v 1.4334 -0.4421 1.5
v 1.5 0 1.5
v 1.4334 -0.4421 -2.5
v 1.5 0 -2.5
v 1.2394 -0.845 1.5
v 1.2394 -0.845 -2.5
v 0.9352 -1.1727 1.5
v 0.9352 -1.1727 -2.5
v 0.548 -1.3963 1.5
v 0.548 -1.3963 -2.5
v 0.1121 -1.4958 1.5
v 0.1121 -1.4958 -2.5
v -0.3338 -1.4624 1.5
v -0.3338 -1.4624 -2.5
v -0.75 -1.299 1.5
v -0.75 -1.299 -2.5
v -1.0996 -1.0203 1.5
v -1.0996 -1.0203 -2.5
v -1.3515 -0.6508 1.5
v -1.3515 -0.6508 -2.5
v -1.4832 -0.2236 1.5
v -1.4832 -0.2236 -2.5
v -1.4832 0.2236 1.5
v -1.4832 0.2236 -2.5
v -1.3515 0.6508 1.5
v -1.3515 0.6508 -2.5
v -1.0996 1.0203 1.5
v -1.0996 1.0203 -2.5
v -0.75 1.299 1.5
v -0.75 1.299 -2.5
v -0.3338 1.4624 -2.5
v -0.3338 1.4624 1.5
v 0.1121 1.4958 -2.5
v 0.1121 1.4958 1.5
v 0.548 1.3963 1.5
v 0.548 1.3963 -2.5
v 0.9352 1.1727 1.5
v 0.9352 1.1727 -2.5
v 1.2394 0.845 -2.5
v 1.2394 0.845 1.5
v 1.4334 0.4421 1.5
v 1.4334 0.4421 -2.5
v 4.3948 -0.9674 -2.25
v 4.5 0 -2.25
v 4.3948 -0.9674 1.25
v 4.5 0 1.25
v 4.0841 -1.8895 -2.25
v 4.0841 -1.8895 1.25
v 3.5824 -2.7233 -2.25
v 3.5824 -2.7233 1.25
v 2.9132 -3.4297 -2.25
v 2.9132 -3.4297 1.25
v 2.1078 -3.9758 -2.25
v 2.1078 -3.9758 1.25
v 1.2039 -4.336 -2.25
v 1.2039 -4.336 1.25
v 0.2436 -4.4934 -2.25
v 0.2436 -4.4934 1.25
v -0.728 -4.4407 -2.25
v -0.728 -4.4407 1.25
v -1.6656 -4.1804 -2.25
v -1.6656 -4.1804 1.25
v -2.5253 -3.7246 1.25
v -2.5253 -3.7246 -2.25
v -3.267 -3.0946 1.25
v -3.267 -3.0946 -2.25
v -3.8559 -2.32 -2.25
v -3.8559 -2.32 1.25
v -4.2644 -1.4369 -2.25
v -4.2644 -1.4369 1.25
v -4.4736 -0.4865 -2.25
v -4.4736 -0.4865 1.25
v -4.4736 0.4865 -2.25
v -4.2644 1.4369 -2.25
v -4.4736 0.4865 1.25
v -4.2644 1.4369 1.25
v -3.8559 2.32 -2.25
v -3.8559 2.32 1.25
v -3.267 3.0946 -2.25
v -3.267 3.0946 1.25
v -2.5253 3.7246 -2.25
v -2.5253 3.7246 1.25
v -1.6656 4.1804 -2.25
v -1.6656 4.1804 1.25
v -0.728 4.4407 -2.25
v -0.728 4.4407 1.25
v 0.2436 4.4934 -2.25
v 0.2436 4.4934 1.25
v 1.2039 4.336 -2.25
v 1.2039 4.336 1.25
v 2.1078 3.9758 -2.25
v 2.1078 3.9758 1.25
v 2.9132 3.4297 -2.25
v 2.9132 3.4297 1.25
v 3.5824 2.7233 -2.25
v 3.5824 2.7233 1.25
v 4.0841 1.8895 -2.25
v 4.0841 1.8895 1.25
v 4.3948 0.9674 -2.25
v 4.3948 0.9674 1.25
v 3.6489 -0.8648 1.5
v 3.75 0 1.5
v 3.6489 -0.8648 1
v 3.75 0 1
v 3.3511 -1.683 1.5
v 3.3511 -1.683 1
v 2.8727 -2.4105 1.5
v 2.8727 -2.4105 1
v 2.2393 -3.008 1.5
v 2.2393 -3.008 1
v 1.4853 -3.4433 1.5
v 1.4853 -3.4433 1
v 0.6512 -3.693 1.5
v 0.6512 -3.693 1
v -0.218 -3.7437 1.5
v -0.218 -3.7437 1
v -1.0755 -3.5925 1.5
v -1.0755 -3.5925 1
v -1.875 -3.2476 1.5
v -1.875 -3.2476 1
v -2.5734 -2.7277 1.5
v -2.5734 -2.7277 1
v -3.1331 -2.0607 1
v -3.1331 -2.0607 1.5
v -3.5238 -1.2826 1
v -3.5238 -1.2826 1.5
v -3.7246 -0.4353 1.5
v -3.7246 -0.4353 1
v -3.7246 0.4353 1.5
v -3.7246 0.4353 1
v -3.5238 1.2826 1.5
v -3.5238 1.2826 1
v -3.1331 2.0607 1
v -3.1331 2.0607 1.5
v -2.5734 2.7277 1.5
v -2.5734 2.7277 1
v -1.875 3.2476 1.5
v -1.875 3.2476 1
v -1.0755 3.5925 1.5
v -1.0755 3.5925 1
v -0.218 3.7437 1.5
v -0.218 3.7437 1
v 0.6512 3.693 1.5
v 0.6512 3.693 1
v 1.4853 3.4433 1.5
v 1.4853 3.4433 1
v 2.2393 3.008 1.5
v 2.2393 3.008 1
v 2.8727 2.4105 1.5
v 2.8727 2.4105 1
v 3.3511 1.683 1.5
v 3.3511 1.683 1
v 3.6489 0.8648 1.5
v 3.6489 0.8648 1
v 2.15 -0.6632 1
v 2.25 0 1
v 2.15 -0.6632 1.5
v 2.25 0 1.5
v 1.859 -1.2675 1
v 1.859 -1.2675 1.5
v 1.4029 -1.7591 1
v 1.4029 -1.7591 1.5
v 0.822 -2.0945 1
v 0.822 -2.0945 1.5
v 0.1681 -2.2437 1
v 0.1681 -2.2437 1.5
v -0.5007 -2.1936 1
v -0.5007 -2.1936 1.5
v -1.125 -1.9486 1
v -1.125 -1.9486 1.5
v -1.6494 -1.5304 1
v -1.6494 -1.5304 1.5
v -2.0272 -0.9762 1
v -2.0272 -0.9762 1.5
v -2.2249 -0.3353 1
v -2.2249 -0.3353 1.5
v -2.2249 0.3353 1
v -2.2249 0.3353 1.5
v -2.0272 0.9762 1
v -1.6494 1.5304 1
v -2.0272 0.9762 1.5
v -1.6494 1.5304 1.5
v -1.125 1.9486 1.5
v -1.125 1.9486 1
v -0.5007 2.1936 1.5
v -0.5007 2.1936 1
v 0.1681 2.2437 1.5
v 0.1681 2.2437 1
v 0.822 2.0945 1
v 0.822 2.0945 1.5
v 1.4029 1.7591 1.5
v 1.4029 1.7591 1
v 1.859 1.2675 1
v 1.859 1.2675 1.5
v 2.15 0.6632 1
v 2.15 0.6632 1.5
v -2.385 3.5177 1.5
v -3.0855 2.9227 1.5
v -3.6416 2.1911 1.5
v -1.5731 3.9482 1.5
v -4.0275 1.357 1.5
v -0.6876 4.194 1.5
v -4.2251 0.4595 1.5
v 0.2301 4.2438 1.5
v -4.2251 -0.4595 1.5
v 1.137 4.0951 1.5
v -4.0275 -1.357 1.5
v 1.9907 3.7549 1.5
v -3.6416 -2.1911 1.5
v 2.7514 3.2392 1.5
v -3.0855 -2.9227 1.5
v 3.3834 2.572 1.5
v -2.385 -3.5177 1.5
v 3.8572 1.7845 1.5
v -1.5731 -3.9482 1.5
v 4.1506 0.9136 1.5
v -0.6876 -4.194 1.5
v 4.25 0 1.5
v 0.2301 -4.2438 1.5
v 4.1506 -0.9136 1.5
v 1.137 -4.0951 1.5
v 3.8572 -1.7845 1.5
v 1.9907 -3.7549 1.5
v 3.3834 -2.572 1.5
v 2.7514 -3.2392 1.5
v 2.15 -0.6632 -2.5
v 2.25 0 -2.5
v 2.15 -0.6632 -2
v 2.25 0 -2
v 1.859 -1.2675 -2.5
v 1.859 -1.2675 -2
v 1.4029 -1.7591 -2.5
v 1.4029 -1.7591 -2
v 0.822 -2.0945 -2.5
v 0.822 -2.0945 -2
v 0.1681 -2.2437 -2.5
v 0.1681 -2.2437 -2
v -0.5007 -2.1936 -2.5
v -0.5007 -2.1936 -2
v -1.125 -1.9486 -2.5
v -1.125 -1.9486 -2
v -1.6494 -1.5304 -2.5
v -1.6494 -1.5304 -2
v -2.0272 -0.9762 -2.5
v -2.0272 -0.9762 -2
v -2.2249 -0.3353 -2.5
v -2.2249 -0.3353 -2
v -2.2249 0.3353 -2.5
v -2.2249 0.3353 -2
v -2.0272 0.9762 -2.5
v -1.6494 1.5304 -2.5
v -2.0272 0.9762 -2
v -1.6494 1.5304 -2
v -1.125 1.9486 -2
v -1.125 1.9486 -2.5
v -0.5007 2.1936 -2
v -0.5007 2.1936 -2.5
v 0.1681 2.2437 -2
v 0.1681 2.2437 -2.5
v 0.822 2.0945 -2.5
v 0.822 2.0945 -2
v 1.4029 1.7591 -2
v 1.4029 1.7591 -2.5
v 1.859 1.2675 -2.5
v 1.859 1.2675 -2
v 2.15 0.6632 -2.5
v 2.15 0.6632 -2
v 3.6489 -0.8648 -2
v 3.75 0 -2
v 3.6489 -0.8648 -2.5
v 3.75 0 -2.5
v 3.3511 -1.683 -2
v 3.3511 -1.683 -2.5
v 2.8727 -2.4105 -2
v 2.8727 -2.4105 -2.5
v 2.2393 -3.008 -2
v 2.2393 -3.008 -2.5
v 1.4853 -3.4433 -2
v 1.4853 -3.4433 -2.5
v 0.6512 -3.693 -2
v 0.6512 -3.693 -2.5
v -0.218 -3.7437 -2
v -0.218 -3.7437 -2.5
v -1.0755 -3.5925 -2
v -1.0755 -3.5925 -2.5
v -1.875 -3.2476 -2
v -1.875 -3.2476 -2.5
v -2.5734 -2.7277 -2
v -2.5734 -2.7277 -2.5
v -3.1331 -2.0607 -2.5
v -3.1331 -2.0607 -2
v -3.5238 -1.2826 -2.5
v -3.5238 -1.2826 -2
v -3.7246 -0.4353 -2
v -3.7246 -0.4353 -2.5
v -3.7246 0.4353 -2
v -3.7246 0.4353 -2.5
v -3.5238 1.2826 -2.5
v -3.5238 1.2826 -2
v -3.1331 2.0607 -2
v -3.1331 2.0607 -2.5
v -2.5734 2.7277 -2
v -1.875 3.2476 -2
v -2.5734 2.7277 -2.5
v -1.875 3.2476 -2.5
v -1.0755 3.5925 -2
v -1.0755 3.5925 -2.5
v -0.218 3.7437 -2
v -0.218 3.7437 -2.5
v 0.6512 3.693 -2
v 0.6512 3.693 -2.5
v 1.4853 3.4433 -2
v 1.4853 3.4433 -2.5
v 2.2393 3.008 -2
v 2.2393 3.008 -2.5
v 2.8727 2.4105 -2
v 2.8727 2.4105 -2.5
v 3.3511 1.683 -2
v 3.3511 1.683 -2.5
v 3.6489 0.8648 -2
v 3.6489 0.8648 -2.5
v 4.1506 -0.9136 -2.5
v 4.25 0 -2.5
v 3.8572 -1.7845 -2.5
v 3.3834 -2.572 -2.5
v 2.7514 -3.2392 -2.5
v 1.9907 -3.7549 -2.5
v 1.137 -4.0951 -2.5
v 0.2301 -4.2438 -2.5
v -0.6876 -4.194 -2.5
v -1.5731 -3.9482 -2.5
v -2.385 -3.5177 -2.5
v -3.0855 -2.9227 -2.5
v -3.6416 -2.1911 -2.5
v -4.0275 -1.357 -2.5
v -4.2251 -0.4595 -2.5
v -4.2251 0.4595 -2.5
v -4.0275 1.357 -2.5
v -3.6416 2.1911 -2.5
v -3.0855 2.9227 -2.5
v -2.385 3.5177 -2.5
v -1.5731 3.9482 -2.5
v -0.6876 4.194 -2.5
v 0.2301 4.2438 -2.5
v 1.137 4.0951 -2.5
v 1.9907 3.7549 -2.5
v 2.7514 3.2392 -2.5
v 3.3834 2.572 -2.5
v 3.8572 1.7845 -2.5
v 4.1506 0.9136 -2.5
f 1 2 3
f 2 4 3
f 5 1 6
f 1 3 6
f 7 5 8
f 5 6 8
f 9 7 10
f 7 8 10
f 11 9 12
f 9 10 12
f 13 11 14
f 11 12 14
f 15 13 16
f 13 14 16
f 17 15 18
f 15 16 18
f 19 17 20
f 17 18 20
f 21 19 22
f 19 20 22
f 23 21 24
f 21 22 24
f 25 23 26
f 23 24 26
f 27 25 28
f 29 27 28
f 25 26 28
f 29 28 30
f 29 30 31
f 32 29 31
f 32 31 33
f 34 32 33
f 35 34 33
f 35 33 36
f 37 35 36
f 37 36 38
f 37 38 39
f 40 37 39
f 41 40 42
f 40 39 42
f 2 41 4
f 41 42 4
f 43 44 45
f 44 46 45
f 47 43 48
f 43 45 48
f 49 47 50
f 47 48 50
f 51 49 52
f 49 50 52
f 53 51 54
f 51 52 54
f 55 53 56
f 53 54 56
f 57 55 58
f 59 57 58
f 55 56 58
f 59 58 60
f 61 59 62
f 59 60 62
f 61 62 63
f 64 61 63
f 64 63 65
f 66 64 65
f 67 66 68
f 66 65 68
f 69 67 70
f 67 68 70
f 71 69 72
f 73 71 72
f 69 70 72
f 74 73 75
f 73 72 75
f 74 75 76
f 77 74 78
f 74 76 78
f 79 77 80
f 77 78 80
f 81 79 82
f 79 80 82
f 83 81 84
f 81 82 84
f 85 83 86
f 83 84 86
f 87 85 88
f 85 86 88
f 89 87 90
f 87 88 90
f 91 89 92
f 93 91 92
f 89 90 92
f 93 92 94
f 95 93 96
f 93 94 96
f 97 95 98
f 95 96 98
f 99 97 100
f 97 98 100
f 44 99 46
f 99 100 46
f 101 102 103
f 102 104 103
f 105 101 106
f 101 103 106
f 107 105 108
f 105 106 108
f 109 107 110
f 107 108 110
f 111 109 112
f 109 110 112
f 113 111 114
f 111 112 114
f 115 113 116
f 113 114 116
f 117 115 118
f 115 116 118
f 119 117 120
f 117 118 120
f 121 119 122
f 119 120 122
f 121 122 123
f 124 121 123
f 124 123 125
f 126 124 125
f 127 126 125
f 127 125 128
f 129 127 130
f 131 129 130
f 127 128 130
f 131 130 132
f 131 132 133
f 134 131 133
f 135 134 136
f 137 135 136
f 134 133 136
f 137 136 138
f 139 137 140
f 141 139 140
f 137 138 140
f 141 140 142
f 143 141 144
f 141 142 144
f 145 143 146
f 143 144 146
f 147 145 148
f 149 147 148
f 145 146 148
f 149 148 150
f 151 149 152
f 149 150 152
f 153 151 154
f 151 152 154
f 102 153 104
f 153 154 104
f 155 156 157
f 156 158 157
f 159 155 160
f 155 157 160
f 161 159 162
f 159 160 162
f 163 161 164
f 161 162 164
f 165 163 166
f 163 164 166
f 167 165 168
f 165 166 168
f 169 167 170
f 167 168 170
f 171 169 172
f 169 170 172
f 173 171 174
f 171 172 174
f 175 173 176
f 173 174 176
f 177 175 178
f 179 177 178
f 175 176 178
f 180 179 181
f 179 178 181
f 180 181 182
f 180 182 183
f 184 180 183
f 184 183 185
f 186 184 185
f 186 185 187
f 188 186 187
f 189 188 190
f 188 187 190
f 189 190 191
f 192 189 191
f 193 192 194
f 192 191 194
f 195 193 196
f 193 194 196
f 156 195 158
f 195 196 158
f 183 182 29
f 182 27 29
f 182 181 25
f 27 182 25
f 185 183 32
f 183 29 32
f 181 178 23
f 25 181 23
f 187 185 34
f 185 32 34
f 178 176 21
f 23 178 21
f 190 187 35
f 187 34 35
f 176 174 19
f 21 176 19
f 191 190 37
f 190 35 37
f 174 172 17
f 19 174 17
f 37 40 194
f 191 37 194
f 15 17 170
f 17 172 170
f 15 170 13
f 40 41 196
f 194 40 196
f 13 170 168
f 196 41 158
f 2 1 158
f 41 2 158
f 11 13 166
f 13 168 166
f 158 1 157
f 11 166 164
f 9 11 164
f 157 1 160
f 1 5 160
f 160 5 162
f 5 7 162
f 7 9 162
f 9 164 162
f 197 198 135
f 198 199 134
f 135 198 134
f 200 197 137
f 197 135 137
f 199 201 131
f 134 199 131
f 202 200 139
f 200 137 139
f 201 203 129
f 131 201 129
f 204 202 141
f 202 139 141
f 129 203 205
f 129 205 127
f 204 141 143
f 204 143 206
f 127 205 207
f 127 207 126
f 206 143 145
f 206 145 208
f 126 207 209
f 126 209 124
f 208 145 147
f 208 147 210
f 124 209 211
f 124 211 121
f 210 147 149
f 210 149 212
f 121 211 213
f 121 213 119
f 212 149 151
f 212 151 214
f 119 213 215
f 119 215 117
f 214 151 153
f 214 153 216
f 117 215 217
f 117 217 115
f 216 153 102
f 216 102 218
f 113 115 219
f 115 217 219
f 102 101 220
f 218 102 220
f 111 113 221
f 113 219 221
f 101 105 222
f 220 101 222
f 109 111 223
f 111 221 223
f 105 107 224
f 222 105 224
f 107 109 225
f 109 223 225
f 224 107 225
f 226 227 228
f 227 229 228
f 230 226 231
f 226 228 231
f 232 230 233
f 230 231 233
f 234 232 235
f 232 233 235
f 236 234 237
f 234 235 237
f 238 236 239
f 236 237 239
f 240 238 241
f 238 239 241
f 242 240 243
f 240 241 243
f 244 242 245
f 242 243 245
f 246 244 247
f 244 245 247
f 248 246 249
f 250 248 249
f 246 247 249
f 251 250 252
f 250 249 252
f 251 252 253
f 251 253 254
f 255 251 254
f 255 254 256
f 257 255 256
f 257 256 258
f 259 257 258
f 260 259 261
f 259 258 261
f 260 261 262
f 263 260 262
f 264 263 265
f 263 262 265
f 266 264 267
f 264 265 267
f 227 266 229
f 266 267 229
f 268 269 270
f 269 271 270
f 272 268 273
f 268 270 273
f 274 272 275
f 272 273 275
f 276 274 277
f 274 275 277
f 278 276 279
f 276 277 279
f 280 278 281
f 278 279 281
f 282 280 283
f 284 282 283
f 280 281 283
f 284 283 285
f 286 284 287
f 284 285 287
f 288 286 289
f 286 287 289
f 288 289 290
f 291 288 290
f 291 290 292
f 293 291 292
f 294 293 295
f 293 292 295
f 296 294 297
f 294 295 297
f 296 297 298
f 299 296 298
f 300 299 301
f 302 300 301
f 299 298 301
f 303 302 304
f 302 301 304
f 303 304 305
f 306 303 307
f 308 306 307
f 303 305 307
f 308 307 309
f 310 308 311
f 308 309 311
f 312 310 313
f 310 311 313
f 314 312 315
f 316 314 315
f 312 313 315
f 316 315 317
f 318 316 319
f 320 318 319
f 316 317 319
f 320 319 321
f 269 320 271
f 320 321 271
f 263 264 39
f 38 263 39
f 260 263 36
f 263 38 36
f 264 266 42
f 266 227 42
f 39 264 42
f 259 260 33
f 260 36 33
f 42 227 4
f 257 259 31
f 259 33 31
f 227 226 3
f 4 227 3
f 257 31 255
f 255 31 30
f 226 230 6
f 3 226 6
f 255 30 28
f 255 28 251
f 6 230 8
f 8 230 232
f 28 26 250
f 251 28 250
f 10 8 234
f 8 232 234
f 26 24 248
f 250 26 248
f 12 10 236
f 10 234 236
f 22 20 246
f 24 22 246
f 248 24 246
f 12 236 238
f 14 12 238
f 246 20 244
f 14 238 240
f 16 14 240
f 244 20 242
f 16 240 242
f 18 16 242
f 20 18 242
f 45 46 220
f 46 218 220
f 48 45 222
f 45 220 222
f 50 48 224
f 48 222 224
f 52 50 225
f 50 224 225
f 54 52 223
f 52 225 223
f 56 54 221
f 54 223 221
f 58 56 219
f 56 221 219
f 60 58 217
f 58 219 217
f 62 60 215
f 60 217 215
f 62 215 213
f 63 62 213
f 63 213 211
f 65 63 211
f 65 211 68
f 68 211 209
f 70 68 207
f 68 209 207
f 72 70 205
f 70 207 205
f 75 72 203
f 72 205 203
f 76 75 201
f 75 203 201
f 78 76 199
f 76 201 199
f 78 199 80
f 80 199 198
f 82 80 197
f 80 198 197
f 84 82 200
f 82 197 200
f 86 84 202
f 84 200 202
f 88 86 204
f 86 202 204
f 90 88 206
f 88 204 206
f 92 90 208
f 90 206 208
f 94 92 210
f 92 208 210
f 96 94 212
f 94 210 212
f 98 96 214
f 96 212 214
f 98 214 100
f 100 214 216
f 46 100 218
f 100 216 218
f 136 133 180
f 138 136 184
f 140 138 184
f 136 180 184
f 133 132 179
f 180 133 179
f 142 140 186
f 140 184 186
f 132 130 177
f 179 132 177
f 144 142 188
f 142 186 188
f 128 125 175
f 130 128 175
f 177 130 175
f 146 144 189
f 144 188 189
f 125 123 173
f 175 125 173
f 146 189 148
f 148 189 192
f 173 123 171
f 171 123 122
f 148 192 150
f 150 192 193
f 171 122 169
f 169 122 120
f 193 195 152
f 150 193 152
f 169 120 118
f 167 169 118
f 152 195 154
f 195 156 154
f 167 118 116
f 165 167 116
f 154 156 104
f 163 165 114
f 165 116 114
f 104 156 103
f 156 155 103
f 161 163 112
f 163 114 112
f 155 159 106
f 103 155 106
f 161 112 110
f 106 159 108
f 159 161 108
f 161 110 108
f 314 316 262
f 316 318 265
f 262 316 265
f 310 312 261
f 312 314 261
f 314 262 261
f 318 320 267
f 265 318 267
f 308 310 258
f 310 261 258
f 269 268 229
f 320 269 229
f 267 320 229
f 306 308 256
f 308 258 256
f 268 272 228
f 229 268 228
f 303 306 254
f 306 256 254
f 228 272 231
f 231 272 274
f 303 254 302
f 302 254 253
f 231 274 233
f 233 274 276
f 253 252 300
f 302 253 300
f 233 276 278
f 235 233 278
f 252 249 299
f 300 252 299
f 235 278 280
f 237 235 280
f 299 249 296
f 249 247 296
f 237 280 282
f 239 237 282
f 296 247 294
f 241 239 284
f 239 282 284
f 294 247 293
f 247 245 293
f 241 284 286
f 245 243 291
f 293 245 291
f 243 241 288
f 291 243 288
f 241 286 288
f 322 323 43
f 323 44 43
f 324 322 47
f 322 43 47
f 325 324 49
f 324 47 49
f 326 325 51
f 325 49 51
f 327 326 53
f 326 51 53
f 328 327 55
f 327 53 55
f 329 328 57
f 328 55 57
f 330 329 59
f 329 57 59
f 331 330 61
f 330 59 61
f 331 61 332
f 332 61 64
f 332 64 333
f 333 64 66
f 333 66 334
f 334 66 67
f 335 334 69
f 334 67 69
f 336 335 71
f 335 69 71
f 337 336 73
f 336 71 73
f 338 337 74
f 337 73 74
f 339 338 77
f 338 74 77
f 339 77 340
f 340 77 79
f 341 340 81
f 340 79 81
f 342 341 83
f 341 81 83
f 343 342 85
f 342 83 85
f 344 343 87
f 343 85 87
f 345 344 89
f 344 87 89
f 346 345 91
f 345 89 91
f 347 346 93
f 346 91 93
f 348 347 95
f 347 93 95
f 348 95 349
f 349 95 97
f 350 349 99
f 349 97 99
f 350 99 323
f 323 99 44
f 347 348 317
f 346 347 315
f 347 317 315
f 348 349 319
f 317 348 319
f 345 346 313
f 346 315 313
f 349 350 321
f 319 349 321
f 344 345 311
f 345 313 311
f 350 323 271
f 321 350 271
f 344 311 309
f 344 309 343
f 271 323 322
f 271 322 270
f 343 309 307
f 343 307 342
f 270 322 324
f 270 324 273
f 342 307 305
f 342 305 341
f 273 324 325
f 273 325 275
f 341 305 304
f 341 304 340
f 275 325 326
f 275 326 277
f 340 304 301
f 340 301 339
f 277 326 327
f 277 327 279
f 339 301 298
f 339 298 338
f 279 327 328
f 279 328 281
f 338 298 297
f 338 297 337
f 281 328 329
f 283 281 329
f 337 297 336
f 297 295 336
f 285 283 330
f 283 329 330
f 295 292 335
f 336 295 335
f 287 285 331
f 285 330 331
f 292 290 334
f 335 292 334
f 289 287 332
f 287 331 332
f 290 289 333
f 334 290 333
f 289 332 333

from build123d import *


with BuildPart() as part:
    # Sketch1 → Revolve1 (revolve)
    with BuildSketch(Plane.XZ):
        Polygon((4.5, 1.25), (4.25, 1.5), (3.75, 1.5), (3.75, 1), (2.25, 1), (2.25, 1.5), (1.5, 1.5), (1.5, -2.5), (2.25, -2.5), (2.25, -2), (3.75, -2), (3.75, -2.5), (4.25, -2.5), (4.5, -2.25), align=None)
    revolve(axis=Axis((0, 0, 2.5), (0, 0, -1)))


solid = part.part
